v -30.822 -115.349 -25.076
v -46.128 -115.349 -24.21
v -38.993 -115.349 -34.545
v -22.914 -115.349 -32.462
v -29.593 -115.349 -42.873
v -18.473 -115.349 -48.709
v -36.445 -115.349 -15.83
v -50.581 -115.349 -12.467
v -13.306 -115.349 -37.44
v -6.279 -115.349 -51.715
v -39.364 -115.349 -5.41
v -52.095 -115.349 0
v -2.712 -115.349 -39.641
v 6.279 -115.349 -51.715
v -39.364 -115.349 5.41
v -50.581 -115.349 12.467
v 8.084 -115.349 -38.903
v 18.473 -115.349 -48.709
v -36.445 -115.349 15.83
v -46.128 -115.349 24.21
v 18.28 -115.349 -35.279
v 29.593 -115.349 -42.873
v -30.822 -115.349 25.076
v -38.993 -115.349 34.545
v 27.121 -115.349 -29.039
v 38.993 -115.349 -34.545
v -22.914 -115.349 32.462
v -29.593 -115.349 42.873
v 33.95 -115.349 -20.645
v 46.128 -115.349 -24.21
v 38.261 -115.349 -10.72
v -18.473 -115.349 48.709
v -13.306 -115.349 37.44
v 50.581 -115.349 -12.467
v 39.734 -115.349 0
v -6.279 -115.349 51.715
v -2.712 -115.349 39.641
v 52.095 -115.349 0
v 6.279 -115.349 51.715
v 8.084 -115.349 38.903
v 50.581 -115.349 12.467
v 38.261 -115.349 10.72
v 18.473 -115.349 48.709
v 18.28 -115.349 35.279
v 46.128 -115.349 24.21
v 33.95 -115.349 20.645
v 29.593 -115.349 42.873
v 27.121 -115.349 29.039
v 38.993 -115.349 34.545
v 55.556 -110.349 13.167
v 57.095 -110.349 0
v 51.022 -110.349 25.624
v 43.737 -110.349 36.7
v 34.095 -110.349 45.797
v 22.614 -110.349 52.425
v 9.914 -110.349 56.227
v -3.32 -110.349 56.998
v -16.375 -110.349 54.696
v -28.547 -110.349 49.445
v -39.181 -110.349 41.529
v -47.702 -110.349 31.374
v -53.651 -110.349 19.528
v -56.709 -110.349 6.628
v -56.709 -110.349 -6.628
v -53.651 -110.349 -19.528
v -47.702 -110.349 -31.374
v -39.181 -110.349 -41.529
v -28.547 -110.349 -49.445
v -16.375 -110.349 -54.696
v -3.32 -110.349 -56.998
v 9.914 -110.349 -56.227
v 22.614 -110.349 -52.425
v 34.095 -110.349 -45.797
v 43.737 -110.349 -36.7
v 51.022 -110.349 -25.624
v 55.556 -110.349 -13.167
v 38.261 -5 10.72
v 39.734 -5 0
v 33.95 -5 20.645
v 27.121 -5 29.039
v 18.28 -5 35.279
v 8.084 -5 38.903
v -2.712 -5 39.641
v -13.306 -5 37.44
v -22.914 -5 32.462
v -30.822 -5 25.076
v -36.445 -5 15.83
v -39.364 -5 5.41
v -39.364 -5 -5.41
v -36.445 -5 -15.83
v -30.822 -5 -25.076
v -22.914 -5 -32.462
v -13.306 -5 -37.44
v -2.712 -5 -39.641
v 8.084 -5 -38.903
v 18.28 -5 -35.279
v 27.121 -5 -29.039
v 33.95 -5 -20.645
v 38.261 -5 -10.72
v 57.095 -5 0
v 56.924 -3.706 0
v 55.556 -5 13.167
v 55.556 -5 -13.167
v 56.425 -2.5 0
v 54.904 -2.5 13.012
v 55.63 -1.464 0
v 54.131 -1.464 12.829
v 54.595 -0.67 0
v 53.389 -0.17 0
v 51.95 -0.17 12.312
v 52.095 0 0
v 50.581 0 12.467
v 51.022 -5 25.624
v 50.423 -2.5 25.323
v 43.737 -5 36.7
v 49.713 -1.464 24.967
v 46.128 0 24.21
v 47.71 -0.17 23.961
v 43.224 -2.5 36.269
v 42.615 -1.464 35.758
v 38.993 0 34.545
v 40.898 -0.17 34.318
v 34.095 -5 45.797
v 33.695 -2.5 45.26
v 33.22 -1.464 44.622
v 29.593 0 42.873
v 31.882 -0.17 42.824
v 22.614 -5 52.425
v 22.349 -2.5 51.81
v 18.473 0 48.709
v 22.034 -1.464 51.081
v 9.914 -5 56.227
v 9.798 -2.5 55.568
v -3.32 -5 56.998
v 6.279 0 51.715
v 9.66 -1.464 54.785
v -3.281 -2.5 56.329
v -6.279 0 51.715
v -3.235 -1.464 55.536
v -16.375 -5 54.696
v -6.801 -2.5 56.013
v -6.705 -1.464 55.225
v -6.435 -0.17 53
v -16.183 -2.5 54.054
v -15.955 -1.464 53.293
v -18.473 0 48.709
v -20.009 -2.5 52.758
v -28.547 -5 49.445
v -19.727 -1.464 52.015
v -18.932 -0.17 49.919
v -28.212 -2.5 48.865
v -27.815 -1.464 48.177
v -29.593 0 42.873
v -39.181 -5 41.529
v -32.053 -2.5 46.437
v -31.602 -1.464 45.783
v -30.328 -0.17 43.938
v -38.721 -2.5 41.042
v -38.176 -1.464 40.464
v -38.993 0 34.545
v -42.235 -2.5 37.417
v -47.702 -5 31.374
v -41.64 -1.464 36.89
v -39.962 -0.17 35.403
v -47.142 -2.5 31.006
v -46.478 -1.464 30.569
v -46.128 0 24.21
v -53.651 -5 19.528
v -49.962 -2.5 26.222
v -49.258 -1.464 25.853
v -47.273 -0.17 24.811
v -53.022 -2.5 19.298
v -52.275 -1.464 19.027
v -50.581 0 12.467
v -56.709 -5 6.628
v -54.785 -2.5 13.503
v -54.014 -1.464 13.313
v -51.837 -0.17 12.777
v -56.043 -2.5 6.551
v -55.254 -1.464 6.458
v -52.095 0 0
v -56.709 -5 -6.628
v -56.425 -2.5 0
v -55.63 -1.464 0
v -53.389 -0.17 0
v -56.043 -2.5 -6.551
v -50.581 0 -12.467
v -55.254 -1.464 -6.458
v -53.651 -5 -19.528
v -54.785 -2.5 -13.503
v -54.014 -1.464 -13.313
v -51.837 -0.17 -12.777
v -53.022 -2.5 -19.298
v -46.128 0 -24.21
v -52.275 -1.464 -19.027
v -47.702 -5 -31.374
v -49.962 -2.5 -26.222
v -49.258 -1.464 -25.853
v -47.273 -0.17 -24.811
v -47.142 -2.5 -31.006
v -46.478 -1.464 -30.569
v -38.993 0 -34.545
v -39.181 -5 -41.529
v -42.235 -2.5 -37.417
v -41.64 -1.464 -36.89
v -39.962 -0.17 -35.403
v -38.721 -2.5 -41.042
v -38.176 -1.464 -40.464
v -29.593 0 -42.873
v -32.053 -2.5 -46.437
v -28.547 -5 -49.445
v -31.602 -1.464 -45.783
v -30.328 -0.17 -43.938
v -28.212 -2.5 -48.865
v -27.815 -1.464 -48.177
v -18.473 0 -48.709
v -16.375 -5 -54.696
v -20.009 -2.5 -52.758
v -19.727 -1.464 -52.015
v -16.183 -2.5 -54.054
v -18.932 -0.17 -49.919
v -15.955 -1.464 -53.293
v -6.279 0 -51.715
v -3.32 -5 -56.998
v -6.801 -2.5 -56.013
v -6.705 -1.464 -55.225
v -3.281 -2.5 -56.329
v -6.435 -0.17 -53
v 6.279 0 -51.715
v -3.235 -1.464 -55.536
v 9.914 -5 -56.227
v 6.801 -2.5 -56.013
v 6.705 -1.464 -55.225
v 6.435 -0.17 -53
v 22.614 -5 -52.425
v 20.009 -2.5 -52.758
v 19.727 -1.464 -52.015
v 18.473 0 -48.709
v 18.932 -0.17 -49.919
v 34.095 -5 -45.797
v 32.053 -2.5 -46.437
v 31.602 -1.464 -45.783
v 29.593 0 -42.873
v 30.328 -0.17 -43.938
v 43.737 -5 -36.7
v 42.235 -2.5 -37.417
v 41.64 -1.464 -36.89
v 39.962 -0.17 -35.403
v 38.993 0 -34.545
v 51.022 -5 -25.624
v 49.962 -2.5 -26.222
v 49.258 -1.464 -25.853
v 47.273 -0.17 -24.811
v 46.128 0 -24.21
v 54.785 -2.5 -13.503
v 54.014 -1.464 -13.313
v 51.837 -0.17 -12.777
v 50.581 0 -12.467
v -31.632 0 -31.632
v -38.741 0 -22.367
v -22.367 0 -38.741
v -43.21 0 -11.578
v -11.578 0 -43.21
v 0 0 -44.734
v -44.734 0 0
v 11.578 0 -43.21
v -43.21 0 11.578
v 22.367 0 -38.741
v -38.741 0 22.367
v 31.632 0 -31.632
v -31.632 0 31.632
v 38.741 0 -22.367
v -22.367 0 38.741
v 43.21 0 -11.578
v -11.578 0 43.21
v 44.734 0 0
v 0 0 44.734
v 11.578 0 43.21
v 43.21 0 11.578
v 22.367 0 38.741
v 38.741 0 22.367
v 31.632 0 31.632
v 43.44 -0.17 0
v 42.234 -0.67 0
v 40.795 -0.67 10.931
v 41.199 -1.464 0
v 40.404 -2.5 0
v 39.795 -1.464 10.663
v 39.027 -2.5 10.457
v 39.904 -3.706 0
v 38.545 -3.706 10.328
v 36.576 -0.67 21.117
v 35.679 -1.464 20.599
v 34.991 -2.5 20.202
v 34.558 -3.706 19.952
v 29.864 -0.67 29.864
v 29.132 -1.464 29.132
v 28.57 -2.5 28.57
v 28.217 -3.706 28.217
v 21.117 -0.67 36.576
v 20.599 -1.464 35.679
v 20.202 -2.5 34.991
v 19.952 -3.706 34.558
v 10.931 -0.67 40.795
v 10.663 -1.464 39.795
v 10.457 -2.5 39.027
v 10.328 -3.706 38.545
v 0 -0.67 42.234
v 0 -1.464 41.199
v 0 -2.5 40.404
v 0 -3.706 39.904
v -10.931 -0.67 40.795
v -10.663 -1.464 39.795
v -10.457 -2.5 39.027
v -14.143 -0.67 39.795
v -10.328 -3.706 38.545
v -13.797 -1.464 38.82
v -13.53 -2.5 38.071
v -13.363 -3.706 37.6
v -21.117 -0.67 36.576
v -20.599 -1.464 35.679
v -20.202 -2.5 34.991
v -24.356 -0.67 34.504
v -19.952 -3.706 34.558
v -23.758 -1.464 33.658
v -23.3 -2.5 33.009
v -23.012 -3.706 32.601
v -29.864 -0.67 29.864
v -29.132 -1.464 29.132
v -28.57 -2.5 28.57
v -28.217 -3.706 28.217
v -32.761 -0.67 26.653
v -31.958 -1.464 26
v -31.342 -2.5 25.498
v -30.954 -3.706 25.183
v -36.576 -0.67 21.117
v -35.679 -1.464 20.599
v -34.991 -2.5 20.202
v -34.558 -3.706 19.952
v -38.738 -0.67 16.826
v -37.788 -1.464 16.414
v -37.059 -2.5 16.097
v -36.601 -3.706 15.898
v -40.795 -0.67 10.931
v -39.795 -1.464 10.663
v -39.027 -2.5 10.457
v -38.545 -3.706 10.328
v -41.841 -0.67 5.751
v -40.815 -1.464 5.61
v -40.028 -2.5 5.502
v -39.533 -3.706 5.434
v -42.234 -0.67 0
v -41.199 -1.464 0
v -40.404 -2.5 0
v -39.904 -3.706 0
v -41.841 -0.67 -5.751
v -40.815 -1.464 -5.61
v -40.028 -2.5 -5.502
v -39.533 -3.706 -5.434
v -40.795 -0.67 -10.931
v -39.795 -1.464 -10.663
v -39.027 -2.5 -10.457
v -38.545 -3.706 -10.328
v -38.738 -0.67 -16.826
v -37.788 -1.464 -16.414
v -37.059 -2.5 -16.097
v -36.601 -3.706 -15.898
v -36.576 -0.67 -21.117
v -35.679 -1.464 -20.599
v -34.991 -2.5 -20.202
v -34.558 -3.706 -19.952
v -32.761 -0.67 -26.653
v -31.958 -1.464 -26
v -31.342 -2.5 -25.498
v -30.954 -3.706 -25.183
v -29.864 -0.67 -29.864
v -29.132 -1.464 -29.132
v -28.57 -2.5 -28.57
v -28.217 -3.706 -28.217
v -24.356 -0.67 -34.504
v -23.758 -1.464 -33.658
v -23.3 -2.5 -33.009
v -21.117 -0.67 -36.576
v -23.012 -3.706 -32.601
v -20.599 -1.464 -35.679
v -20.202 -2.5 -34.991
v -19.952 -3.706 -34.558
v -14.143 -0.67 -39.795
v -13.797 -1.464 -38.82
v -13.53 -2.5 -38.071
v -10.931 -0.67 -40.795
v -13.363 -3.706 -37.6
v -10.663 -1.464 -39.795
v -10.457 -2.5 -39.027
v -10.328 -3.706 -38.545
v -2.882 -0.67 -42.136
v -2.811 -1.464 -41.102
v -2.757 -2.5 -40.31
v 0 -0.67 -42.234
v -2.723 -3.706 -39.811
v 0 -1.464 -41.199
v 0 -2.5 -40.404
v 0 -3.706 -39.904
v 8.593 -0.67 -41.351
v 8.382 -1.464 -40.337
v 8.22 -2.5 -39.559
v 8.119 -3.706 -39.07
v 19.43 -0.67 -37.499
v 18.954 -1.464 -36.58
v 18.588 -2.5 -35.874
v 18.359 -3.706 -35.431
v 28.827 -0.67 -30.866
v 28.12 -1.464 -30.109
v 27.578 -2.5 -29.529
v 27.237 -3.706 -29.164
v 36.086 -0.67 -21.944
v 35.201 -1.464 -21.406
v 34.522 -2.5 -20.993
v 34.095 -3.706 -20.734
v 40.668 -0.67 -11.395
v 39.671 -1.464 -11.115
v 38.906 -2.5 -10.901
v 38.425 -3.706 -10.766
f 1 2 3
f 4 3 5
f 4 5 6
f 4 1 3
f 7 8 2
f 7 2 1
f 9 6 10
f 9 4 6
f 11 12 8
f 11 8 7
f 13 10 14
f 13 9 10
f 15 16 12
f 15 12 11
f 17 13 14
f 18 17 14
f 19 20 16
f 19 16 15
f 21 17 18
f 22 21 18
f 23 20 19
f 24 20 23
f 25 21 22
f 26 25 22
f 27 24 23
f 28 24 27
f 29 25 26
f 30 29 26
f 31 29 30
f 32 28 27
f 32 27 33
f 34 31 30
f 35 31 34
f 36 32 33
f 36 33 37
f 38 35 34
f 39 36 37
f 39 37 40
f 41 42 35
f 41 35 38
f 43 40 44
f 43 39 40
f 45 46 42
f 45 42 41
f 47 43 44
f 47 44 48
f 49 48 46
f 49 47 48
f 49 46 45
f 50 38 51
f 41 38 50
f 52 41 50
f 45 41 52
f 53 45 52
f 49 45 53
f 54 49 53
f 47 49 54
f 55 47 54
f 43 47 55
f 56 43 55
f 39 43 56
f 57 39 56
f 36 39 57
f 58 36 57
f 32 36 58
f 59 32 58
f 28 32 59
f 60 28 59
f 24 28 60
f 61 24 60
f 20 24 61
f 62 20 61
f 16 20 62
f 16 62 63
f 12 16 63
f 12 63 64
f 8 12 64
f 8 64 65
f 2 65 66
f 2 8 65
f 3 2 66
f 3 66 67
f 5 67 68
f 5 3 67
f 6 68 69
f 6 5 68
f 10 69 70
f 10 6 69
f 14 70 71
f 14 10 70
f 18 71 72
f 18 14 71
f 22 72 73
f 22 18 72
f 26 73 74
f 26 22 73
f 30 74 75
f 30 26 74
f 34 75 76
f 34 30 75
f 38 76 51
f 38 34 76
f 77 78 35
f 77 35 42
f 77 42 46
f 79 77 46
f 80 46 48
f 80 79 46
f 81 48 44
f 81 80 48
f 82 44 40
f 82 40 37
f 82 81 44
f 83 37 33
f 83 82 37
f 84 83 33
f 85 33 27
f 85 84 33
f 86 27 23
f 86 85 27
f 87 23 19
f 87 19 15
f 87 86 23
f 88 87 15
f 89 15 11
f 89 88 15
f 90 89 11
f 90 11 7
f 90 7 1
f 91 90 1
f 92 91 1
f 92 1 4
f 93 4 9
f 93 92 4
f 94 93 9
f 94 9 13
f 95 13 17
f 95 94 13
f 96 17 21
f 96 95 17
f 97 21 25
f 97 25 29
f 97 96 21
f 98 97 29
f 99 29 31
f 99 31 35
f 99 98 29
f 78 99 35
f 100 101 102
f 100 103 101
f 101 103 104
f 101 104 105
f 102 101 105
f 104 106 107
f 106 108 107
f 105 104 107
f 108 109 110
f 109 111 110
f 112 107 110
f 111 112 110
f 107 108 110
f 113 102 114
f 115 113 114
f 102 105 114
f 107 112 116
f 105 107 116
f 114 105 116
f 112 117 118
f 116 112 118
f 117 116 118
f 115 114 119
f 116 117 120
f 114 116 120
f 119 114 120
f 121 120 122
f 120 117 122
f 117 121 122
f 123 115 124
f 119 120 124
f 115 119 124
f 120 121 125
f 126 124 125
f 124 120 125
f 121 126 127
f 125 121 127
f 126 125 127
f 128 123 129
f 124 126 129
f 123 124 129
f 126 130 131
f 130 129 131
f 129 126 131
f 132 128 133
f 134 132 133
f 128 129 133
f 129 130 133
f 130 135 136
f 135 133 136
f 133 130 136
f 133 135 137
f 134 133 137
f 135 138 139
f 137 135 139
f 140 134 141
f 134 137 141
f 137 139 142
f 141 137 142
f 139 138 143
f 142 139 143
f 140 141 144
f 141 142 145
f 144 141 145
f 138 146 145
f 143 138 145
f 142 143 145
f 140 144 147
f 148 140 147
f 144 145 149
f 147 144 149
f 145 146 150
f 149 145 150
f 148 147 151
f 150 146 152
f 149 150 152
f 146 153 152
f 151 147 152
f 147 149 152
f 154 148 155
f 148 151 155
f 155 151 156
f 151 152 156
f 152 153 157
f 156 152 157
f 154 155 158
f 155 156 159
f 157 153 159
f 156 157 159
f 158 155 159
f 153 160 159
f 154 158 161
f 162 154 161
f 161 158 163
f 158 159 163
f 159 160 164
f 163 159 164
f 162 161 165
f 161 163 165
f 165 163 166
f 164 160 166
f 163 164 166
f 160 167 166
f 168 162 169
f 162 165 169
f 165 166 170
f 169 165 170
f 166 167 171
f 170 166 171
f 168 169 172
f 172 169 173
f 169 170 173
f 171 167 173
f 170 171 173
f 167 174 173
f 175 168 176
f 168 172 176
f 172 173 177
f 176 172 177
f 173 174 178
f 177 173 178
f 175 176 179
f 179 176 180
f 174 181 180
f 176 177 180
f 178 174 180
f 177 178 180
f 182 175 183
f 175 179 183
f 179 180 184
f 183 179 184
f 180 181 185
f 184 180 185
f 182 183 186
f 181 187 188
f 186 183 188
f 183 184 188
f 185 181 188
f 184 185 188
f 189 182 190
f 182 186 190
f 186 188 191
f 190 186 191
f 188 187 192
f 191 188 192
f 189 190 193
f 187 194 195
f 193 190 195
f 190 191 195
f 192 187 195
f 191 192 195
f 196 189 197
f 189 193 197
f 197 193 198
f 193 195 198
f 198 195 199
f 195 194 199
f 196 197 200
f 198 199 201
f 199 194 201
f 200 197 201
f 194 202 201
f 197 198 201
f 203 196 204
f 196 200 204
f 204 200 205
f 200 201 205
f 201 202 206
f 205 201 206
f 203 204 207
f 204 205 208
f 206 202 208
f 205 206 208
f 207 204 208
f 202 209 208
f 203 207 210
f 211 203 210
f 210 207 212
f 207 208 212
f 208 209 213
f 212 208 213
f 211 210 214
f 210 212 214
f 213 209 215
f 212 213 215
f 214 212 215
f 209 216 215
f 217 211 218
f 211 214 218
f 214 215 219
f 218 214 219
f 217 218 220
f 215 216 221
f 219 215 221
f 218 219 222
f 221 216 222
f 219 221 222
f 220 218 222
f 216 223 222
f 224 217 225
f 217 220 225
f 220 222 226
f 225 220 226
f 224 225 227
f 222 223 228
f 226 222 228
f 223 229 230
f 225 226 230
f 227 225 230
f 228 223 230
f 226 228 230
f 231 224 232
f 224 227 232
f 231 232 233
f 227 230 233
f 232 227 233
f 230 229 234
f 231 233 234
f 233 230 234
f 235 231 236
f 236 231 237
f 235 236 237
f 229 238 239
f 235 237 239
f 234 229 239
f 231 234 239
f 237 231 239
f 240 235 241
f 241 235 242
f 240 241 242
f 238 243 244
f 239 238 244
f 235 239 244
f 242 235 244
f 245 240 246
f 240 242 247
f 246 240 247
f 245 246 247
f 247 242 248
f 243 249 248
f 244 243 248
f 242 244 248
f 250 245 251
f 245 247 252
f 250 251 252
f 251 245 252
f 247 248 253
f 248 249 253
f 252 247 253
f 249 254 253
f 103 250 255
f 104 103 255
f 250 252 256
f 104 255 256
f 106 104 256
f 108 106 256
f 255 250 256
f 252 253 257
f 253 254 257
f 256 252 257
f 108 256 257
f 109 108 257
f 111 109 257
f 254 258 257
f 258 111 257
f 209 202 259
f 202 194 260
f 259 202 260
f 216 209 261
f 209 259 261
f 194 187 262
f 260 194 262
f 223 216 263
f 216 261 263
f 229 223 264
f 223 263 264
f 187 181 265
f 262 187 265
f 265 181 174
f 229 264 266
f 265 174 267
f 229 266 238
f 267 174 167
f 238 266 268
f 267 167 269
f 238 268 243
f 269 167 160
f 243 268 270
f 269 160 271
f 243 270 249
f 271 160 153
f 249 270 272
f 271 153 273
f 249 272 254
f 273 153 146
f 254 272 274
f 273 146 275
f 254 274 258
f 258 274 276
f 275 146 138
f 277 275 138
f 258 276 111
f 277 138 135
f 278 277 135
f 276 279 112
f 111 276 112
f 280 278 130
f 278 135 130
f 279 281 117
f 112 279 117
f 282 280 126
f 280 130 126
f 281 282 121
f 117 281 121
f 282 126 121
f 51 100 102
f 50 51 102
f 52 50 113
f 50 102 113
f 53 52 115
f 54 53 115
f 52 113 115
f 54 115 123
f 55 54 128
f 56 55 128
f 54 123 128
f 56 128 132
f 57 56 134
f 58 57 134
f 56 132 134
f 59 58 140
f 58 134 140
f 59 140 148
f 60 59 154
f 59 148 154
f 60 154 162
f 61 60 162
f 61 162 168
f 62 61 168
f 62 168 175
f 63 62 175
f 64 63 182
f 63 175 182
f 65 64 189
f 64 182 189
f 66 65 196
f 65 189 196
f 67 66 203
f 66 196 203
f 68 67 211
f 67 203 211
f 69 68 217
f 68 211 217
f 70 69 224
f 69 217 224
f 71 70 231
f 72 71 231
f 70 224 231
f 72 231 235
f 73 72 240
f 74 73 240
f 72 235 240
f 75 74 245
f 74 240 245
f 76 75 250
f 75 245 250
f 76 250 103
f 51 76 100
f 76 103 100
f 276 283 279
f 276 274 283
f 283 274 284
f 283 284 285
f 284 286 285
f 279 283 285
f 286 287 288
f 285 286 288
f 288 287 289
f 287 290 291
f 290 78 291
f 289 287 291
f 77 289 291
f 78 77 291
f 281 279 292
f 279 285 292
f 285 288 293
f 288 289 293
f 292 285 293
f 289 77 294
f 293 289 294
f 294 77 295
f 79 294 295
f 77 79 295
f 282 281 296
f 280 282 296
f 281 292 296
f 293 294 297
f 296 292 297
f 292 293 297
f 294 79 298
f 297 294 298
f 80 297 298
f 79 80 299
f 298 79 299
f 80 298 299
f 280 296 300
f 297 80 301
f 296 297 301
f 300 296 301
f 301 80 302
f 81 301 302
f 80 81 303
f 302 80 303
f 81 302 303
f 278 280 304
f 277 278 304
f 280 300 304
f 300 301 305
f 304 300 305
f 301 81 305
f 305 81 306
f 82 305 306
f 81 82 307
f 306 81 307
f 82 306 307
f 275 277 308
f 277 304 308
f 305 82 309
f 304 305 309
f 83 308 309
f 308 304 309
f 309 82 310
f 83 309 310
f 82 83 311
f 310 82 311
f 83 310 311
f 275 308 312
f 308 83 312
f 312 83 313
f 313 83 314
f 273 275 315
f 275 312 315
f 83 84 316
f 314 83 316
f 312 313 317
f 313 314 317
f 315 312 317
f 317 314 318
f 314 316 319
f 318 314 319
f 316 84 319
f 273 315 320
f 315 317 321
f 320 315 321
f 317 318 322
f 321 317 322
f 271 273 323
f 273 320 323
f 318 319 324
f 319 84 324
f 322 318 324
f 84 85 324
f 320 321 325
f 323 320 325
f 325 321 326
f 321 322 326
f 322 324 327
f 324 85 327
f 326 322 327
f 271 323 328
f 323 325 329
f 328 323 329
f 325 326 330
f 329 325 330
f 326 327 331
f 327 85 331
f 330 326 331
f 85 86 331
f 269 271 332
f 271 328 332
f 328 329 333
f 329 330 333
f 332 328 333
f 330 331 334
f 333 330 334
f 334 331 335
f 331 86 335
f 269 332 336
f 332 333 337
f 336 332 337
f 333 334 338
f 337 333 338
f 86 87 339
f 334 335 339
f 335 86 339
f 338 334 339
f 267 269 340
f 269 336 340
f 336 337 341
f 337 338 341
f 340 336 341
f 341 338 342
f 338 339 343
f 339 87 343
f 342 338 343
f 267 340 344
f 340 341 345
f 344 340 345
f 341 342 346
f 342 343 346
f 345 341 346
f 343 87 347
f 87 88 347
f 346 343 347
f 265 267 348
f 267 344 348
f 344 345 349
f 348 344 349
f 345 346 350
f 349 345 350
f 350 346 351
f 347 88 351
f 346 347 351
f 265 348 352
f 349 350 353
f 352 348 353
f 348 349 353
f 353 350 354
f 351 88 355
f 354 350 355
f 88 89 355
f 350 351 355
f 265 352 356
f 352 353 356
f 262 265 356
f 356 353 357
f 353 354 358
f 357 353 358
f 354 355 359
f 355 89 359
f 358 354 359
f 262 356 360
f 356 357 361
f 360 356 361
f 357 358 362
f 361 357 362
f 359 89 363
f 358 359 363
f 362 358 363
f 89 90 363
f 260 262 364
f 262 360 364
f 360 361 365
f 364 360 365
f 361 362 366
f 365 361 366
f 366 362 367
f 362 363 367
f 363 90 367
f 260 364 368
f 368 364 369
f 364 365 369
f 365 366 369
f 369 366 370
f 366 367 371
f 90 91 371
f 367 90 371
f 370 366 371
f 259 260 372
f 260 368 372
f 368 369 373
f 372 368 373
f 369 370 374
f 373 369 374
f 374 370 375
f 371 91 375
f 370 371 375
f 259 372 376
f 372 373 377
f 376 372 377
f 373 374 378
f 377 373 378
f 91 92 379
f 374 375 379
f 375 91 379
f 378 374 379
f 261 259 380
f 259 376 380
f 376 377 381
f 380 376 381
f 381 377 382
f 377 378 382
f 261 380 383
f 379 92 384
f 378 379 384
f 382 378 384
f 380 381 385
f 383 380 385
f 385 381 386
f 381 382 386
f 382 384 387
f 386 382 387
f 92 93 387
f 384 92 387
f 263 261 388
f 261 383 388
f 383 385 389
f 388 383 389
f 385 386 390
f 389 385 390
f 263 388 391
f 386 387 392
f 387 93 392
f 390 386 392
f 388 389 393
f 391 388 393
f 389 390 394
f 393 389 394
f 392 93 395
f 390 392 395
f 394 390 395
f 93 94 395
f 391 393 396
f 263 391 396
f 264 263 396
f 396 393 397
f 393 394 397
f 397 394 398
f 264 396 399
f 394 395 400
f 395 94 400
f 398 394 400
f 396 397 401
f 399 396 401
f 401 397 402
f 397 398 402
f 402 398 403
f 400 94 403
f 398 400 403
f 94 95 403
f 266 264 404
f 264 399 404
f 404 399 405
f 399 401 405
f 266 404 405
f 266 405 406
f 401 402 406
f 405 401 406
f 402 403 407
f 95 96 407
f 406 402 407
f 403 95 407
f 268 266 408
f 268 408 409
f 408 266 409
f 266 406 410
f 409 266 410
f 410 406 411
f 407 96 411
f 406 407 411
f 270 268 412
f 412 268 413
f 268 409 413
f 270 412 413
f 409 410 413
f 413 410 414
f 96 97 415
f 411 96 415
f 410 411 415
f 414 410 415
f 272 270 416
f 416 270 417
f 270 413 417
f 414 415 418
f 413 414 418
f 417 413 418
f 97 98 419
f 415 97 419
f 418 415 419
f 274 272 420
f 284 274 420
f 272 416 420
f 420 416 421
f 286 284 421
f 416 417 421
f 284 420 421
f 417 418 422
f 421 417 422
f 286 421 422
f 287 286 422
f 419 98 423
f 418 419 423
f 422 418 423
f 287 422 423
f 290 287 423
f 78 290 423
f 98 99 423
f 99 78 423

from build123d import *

# Parameters (mm, degrees)
F0_R     = 57.09467
F0_R_2   = 39.73405
F1_DEPTH = 115.348577
F2_SIZE  = 5
F3_R     = 5
F4_R     = 5


with BuildPart() as f1:
    # F0 (on Front) → F1 (new body)
    with BuildSketch(Plane.XZ):
        Circle(F0_R)
        Circle(F0_R_2, mode=Mode.SUBTRACT)
    extrude(amount=F1_DEPTH)

    # F2
    f2_edges = [f1.edges().sort_by_distance(p)[0] for p in [
        (-57.09467, -115.348577, 0),
    ]]
    chamfer(f2_edges, length=F2_SIZE)

    # F3
    f3_edges = [f1.edges().sort_by_distance(p)[0] for p in [
        (-57.09467, 0, 0),
    ]]
    fillet(f3_edges, radius=F3_R)

    # F4
    f4_edges = [f1.edges().sort_by_distance(p)[0] for p in [
        (-39.73405, 0, 0),
    ]]
    fillet(f4_edges, radius=F4_R)


solid = f1.part
